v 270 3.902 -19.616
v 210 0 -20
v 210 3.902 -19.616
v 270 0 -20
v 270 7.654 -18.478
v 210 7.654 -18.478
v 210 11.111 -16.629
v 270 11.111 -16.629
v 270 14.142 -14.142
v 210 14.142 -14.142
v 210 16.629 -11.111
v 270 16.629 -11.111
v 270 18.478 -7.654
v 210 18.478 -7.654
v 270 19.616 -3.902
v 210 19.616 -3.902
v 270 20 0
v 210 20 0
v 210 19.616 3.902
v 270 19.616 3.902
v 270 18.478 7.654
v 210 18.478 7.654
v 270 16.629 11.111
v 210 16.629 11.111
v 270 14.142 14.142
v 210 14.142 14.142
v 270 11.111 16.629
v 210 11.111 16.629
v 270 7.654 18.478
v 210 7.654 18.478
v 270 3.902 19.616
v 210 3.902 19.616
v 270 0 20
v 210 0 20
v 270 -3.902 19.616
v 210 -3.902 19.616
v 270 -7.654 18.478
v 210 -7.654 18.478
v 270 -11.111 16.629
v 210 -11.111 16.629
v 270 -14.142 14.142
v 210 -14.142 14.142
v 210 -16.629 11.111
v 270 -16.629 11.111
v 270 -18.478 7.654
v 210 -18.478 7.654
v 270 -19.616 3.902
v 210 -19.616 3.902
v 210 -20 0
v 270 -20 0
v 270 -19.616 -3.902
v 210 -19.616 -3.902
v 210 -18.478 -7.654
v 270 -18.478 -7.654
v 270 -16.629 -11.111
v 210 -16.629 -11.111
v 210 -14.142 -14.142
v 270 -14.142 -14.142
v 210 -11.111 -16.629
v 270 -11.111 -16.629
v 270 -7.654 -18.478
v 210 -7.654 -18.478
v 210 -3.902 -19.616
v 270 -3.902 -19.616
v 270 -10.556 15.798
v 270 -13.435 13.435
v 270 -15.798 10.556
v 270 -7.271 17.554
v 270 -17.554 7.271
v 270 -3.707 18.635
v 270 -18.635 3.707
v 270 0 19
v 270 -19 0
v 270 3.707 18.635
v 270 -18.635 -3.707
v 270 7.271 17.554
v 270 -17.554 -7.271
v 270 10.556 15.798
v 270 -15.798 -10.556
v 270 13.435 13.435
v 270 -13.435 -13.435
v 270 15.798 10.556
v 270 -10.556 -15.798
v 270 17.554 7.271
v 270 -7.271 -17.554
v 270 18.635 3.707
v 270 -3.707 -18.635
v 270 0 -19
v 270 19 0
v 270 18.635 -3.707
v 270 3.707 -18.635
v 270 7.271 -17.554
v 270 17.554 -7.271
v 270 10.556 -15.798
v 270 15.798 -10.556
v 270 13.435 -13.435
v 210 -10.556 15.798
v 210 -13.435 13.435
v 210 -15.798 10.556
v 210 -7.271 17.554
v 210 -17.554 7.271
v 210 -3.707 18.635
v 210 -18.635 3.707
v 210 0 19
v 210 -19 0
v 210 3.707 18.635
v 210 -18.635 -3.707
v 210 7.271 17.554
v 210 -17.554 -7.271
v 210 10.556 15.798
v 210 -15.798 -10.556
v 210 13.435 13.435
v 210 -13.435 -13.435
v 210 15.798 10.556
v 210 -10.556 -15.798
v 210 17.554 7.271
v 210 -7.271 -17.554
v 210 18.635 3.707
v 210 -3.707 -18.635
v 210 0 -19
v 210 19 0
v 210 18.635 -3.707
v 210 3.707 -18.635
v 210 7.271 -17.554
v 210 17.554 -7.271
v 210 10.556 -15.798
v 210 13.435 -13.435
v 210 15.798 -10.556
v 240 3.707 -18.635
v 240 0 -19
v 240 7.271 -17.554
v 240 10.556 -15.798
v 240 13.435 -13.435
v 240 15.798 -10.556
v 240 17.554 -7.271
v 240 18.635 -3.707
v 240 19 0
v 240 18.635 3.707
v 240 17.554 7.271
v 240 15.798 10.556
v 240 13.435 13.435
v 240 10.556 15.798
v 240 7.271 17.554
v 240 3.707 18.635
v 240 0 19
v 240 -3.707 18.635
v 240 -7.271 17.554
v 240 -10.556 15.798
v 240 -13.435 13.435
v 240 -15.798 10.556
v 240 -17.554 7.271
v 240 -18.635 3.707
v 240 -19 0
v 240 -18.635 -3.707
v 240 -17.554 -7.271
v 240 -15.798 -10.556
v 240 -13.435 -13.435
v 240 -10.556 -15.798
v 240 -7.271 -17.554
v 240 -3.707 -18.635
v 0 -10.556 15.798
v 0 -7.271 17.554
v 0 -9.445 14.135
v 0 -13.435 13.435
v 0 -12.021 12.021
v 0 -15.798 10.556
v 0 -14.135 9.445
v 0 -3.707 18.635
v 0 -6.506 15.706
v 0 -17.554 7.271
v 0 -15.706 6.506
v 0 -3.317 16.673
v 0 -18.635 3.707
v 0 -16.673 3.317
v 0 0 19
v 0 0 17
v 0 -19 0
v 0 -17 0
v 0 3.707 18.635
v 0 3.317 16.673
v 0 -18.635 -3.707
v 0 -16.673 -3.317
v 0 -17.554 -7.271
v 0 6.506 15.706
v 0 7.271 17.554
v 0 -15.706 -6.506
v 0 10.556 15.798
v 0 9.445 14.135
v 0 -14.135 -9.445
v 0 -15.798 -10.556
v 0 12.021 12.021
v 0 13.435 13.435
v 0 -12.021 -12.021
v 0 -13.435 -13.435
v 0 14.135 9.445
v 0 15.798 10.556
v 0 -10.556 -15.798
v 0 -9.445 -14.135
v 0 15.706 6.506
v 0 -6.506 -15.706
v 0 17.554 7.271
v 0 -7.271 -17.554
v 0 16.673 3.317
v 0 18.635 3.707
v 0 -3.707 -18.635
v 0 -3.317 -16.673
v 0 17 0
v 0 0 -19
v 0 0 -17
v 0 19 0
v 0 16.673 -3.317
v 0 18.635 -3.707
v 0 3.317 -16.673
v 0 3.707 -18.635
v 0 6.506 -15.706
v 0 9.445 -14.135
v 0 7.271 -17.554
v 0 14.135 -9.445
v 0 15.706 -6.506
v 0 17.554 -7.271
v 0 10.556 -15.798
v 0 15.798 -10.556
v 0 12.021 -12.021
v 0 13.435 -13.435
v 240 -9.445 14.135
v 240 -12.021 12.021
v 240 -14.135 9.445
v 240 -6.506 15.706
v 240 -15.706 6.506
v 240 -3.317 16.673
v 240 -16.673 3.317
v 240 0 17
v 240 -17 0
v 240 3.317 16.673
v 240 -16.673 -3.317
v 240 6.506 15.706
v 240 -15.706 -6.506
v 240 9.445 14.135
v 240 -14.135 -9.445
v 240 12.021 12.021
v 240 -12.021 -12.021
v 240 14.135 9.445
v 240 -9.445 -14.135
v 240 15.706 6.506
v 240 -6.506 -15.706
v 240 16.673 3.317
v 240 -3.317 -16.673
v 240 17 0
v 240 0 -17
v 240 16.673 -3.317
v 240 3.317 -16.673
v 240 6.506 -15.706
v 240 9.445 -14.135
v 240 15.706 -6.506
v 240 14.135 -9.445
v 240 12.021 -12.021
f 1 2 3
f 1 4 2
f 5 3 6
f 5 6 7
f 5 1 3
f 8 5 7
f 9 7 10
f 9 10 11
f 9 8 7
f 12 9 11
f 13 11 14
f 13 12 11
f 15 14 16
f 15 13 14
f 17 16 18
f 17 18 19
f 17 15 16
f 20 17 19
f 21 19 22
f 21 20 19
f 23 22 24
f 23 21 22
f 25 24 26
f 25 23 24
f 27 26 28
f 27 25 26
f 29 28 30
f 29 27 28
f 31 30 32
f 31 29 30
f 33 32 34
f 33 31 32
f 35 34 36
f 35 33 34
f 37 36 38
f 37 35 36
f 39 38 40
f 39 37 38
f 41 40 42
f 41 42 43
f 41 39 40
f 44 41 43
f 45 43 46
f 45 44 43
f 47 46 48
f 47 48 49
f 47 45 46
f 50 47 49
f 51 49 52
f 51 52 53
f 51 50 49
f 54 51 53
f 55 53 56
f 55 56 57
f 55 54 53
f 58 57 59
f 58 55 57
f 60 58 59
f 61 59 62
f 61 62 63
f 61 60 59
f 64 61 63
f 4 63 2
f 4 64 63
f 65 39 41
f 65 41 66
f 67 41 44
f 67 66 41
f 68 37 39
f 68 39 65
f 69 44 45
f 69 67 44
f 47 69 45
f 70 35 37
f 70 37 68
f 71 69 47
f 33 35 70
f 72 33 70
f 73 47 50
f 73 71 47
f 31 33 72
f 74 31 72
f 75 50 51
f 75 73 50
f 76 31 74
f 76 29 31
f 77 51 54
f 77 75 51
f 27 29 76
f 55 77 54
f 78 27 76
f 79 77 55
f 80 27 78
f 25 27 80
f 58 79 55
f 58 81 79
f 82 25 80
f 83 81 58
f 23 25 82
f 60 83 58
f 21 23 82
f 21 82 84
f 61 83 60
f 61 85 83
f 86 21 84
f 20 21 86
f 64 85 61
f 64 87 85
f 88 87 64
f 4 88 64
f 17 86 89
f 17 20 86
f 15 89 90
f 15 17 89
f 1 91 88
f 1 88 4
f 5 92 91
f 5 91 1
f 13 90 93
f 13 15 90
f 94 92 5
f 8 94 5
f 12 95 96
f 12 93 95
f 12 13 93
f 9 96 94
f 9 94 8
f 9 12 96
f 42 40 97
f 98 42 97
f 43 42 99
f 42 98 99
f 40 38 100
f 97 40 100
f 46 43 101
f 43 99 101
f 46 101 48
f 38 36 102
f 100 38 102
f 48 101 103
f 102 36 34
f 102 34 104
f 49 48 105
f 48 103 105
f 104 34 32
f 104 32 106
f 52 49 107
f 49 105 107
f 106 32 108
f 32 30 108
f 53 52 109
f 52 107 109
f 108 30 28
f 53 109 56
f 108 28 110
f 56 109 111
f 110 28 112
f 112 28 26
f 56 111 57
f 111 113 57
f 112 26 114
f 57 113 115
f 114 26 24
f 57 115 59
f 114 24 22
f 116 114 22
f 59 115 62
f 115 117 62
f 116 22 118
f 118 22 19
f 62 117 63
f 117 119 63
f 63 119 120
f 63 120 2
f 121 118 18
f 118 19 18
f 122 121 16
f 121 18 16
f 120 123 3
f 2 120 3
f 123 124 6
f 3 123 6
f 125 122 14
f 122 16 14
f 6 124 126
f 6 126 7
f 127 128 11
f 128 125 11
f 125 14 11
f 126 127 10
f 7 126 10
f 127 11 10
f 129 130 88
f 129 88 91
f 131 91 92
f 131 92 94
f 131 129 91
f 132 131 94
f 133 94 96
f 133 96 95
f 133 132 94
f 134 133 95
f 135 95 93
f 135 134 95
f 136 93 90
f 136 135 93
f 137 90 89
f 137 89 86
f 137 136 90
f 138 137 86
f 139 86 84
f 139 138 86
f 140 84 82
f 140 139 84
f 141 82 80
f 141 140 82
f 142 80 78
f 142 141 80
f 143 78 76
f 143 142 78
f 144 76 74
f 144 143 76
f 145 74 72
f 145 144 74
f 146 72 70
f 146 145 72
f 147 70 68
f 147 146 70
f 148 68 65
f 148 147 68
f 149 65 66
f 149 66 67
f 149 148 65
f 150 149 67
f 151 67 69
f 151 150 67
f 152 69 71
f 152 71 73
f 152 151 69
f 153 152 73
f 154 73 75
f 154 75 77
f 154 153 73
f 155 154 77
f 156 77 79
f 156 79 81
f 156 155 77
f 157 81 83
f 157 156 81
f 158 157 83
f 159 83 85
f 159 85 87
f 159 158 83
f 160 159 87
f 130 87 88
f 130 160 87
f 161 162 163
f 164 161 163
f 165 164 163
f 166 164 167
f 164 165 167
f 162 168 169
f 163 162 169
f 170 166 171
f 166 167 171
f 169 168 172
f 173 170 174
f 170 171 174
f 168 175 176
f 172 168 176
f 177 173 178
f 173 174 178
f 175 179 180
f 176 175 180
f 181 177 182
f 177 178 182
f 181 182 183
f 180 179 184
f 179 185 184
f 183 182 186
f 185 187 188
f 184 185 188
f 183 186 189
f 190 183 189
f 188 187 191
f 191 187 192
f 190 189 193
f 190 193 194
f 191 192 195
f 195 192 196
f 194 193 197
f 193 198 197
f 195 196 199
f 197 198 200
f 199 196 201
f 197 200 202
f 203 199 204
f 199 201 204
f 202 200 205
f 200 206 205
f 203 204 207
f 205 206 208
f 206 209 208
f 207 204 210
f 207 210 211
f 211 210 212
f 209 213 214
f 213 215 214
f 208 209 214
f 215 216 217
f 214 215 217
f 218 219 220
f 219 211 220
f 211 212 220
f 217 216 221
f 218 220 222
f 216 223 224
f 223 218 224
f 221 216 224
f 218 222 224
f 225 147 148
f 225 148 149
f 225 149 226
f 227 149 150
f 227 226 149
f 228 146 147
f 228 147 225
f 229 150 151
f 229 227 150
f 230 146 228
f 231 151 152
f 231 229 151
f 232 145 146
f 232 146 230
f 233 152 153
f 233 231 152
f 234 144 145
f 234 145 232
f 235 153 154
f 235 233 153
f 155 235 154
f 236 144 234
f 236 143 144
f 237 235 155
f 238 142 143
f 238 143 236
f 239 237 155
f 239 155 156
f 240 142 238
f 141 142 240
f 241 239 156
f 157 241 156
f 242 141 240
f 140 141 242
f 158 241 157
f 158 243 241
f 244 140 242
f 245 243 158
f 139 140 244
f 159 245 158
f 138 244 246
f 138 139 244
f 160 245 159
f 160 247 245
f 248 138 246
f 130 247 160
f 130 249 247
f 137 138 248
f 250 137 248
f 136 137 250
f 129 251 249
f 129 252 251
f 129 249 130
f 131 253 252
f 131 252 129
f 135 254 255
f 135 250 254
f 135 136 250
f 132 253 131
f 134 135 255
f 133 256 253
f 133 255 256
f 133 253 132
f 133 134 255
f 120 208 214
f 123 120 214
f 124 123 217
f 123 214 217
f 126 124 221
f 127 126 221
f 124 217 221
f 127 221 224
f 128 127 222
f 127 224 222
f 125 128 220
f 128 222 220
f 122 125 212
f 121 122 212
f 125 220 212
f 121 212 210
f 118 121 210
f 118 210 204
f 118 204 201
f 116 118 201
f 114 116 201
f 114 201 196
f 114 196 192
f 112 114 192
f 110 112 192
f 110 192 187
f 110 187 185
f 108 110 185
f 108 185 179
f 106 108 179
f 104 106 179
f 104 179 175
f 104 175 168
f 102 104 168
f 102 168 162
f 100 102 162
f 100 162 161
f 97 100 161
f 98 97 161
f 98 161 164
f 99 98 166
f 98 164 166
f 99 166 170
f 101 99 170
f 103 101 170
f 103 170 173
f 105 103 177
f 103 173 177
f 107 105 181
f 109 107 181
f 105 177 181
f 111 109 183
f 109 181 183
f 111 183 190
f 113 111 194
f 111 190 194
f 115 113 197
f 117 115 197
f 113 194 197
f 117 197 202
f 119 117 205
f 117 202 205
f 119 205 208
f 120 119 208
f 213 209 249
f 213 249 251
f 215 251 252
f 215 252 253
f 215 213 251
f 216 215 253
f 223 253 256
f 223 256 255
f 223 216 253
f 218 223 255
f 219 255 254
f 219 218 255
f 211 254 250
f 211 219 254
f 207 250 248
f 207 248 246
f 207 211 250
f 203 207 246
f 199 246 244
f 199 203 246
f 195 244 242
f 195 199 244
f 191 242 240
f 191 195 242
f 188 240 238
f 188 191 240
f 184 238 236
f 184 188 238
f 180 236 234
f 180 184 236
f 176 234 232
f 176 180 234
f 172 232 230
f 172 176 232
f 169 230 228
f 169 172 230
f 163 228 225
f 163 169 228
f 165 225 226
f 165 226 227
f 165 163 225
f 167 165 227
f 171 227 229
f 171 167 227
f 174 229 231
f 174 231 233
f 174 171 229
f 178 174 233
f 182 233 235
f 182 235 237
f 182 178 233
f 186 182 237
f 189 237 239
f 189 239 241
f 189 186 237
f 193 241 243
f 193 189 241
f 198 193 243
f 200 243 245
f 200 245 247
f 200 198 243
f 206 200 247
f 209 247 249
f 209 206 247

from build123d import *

# Parameters (mm, degrees)
SKETCH1_R           = 19
SKETCH1_R_2         = 17
BOSS_EXTRUDE1_DEPTH = 240
SKETCH2_R           = 20
SKETCH2_R_2         = 19
BOSS_EXTRUDE2_DEPTH = 30


with BuildPart() as part:
    # Sketch1 → Boss-Extrude1 (new body)
    with BuildSketch(Plane(origin=(0, 0, 0), x_dir=(0, 0, -1), z_dir=(1, 0, 0))):
        Circle(SKETCH1_R)
        Circle(SKETCH1_R_2, mode=Mode.SUBTRACT)
    extrude(amount=BOSS_EXTRUDE1_DEPTH)

    # Sketch2 → Boss-Extrude2 (add, symmetric)
    with BuildSketch(Plane(origin=(240, 0, 0), x_dir=(0, 0, -1), z_dir=(1, 0, 0))):
        Circle(SKETCH2_R)
        Circle(SKETCH2_R_2, mode=Mode.SUBTRACT)
    extrude(amount=BOSS_EXTRUDE2_DEPTH, both=True)


solid = part.part
